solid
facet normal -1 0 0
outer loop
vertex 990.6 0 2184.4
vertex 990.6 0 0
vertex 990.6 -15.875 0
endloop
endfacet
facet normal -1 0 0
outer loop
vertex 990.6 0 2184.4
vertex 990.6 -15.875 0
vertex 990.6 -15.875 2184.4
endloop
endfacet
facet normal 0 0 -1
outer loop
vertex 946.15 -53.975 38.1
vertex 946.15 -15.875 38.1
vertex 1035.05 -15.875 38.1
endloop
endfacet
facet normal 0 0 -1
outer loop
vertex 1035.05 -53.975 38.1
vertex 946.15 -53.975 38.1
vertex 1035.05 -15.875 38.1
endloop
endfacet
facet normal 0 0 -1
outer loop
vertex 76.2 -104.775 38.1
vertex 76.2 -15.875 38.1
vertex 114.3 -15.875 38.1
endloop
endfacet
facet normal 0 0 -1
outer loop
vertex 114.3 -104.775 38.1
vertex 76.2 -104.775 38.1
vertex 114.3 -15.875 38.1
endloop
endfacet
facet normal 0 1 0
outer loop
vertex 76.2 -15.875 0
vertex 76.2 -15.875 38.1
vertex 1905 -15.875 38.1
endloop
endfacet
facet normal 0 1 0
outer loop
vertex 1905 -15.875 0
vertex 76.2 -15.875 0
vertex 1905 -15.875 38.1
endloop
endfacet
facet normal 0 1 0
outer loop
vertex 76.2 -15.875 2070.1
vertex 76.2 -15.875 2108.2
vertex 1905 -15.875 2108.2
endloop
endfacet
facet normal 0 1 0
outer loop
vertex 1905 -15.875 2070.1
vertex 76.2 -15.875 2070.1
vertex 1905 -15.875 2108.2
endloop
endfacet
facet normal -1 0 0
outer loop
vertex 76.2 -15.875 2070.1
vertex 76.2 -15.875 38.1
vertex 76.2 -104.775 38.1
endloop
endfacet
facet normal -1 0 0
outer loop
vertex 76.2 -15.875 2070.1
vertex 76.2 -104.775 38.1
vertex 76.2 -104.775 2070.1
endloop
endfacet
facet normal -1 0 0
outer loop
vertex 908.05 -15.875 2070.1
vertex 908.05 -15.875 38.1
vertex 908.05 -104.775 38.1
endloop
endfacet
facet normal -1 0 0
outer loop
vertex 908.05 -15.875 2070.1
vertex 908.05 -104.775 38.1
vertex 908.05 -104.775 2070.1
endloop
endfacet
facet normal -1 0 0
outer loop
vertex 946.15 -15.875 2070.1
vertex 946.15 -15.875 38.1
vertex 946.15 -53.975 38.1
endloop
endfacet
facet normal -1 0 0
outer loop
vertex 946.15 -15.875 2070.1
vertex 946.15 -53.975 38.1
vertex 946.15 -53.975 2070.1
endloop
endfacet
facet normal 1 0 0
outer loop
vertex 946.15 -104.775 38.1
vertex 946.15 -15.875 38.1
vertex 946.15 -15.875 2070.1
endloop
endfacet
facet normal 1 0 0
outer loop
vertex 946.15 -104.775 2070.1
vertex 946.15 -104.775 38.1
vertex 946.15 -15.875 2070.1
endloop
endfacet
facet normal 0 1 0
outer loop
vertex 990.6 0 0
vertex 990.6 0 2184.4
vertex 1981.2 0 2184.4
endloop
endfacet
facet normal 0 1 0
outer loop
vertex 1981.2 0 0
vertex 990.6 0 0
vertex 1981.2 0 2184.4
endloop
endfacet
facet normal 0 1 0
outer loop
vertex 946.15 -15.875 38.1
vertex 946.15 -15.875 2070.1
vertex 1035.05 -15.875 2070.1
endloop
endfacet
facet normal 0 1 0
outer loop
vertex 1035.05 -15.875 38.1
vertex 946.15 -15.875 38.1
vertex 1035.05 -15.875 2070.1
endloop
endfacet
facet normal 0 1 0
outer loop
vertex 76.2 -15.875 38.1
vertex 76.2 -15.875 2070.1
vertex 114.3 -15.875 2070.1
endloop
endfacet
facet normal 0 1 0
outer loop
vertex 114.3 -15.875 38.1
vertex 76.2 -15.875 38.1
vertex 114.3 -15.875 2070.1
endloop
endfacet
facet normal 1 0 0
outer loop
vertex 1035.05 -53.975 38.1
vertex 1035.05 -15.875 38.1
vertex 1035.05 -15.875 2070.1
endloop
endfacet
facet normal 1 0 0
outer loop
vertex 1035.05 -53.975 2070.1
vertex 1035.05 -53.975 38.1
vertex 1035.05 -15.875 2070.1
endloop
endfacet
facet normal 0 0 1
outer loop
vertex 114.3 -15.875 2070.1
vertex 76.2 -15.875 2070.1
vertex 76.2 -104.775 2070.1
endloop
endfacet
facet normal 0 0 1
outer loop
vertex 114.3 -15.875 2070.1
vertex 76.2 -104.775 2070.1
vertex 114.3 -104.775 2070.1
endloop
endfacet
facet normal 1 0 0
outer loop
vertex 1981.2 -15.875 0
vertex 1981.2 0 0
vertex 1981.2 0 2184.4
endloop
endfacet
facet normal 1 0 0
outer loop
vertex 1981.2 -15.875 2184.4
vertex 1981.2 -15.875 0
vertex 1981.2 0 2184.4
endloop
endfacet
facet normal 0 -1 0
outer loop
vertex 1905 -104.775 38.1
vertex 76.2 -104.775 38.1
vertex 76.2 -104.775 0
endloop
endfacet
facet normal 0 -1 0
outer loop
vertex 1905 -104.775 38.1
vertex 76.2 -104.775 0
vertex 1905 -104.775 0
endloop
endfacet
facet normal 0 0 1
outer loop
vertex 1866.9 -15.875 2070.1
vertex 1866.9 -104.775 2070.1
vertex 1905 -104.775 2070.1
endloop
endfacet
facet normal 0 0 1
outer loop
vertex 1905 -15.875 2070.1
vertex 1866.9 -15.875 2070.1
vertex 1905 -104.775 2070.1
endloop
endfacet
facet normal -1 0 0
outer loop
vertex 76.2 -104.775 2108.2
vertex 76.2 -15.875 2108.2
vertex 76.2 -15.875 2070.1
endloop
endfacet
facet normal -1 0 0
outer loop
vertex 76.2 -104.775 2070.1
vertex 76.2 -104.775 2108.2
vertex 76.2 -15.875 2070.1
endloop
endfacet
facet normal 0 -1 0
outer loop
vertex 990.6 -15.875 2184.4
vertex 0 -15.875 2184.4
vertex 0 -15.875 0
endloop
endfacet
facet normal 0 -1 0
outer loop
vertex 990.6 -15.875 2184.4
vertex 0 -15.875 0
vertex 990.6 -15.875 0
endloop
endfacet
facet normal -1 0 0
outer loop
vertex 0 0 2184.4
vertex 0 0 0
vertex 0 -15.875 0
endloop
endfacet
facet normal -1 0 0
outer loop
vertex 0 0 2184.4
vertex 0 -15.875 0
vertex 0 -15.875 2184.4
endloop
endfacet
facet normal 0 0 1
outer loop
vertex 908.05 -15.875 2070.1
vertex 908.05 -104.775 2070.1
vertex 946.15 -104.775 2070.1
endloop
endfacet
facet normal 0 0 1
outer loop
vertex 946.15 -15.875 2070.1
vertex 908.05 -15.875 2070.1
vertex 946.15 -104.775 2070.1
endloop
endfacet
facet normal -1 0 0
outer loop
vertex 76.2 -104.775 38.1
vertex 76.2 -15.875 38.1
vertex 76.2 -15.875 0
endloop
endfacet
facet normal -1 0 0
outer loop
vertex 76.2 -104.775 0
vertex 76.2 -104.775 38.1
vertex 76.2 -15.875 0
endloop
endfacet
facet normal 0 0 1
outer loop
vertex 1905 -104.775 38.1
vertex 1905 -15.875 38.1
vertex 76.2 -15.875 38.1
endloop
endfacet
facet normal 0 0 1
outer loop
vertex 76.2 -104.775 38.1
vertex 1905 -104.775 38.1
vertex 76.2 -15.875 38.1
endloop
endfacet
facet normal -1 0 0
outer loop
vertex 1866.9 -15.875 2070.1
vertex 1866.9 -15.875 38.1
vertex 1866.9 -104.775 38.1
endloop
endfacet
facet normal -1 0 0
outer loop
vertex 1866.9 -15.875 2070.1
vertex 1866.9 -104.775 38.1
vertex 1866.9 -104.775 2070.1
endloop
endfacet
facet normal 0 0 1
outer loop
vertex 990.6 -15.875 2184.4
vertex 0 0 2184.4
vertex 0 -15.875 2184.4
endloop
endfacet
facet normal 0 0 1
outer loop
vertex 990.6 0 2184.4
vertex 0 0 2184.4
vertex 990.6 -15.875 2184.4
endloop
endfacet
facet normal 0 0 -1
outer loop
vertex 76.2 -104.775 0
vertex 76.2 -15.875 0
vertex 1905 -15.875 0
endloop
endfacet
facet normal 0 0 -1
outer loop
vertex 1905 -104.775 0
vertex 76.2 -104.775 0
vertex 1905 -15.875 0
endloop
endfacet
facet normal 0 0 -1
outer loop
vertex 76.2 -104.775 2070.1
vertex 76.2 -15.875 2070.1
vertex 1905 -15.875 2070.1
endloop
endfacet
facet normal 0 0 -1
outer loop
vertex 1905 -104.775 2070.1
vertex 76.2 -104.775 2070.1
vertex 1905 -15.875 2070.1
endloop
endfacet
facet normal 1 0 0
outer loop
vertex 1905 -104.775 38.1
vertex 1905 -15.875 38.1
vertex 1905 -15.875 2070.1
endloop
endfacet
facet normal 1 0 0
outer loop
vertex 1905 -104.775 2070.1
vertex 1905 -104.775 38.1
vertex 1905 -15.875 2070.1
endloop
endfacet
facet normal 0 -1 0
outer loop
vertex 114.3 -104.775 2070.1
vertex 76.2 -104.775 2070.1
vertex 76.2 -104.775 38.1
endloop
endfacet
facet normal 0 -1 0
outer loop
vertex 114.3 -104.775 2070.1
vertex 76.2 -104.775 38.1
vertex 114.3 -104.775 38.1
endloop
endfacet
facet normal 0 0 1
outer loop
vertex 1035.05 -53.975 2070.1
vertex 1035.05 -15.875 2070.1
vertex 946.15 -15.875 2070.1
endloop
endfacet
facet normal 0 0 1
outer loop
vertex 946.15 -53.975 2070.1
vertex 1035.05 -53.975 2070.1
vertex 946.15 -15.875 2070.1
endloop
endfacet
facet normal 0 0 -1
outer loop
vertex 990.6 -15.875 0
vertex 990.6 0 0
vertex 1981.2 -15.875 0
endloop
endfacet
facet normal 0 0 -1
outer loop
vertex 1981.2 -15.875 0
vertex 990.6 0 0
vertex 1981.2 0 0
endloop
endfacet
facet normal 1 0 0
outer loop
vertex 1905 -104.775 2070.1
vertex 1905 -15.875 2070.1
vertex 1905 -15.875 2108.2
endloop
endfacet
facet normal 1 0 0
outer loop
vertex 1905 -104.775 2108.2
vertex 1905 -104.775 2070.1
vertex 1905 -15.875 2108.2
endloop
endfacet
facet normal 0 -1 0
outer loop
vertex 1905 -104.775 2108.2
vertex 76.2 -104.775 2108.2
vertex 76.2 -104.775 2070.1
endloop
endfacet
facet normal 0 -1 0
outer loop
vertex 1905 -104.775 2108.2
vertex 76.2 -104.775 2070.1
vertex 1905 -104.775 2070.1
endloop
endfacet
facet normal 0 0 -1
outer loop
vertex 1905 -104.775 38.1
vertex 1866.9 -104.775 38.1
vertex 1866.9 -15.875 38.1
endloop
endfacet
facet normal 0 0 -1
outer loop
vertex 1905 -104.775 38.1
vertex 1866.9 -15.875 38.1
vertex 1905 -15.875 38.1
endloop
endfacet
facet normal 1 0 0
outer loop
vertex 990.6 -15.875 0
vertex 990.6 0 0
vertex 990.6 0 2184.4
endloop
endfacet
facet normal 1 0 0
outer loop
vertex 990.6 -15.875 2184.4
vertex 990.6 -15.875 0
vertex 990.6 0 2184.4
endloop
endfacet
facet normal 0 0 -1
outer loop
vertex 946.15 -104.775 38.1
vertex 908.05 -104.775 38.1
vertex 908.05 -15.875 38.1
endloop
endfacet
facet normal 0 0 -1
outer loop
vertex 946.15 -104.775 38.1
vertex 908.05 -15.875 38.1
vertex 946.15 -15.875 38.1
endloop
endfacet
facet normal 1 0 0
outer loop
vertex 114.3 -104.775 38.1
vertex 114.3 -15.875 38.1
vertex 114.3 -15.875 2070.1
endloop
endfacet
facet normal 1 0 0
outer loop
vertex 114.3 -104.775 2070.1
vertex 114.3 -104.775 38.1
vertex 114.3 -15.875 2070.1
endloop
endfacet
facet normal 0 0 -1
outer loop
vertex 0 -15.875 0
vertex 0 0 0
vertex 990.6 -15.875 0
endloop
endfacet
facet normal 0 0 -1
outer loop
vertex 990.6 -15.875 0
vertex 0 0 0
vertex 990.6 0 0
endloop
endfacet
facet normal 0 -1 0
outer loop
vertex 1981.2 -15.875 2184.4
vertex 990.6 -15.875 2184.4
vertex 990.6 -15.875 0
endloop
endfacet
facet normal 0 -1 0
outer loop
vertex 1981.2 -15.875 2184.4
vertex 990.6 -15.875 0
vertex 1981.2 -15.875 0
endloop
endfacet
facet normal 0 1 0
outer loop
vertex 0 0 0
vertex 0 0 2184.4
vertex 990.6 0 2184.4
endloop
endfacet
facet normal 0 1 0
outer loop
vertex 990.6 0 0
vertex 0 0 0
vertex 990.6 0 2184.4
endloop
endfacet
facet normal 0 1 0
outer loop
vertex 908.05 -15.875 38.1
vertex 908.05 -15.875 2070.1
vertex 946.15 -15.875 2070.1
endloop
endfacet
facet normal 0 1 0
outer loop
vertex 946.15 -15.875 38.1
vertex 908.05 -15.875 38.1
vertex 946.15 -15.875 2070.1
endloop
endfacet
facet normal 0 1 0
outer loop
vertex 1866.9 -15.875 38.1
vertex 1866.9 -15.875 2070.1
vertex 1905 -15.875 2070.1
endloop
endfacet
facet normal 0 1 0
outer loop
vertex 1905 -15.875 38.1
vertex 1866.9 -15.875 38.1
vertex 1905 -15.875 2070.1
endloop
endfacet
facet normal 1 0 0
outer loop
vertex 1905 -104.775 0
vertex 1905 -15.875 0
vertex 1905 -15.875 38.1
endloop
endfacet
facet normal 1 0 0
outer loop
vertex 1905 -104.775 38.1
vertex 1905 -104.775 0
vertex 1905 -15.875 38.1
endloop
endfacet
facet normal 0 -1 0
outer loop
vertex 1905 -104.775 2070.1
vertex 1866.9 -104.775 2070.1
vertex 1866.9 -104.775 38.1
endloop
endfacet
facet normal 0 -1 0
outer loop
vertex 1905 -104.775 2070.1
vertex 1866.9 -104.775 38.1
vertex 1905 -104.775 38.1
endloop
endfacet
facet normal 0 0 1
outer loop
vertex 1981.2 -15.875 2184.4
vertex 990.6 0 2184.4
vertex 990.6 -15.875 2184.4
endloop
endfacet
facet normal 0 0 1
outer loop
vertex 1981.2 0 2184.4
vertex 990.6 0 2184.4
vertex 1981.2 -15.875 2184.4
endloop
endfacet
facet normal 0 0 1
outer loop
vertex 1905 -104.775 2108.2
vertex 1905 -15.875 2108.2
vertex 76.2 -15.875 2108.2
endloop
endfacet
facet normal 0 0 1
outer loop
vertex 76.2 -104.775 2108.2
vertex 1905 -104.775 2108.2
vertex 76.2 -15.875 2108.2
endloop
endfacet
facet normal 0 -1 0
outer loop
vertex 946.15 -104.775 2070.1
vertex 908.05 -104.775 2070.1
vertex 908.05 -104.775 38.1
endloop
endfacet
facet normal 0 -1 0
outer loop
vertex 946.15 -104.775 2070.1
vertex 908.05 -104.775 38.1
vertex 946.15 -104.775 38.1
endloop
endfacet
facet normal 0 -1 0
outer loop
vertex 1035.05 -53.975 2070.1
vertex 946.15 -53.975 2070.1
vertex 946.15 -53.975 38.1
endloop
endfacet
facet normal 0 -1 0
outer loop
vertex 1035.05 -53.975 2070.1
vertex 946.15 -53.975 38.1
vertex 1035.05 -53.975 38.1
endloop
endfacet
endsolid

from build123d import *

# Parameters (mm, degrees)
F0_W     = 990.6
F0_H     = 2184.4
F1_DEPTH = 15.875
F2_DEPTH = 15.875
F4_DEPTH = 88.9
F3_W     = 38.1
F3_H     = 2032
F5_DEPTH = 88.9
F3_W_2   = 44.45
F6_DEPTH = 38.1


with BuildPart() as f1:
    # F0 (on Front) → F1 (new body)
    with BuildSketch(Plane.XZ):
        with Locations((495.3, 1092.2)):
            Rectangle(F0_W, F0_H)
    extrude(amount=F1_DEPTH)


with BuildPart() as f2:
    # F0 (on Front) → F2 (new body)
    with BuildSketch(Plane.XZ):
        with Locations((1485.9, 1092.2)):
            Rectangle(F0_W, F0_H)
    extrude(amount=F2_DEPTH)


with BuildPart() as f4:
    # F3 (on face) → F4 (new body)
    with BuildSketch(Plane.XZ.offset(15.875)):
        Polygon((990.6, 2108.2), (990.6, 2070.1), (1035.05, 2070.1), (1866.9, 2070.1), (1905, 2070.1), (1905, 2108.2), align=None)
        Polygon((76.2, 2108.2), (76.2, 2070.1), (114.3, 2070.1), (908.05, 2070.1), (946.15, 2070.1), (990.6, 2070.1), (990.6, 2108.2), align=None)
        Polygon((990.6, 38.1), (990.6, 0), (1905, 0), (1905, 38.1), (1866.9, 38.1), (1035.05, 38.1), align=None)
        Polygon((76.2, 38.1), (76.2, 0), (990.6, 0), (990.6, 38.1), (946.15, 38.1), (908.05, 38.1), (114.3, 38.1), align=None)
    extrude(amount=F4_DEPTH)


with BuildPart() as f5:
    # F3 (on face) → F5 (new body)
    with BuildSketch(Plane.XZ.offset(15.875)):
        with Locations((95.25, 1054.1)):
            Rectangle(F3_W, F3_H)
        with Locations((1885.95, 1054.1)):
            Rectangle(F3_W, F3_H)
        with Locations((927.1, 1054.1)):
            Rectangle(F3_W, F3_H)
    extrude(amount=F5_DEPTH)


with BuildPart() as f6:
    # F3 (on face) → F6 (new body)
    with BuildSketch(Plane.XZ.offset(15.875)):
        with Locations((968.375, 1054.1)):
            Rectangle(F3_W_2, F3_H)
        with Locations((1012.825, 1054.1)):
            Rectangle(F3_W_2, F3_H)
    extrude(amount=F6_DEPTH)


solid = Compound([f1.part, f2.part, f4.part, f5.part, f6.part])
